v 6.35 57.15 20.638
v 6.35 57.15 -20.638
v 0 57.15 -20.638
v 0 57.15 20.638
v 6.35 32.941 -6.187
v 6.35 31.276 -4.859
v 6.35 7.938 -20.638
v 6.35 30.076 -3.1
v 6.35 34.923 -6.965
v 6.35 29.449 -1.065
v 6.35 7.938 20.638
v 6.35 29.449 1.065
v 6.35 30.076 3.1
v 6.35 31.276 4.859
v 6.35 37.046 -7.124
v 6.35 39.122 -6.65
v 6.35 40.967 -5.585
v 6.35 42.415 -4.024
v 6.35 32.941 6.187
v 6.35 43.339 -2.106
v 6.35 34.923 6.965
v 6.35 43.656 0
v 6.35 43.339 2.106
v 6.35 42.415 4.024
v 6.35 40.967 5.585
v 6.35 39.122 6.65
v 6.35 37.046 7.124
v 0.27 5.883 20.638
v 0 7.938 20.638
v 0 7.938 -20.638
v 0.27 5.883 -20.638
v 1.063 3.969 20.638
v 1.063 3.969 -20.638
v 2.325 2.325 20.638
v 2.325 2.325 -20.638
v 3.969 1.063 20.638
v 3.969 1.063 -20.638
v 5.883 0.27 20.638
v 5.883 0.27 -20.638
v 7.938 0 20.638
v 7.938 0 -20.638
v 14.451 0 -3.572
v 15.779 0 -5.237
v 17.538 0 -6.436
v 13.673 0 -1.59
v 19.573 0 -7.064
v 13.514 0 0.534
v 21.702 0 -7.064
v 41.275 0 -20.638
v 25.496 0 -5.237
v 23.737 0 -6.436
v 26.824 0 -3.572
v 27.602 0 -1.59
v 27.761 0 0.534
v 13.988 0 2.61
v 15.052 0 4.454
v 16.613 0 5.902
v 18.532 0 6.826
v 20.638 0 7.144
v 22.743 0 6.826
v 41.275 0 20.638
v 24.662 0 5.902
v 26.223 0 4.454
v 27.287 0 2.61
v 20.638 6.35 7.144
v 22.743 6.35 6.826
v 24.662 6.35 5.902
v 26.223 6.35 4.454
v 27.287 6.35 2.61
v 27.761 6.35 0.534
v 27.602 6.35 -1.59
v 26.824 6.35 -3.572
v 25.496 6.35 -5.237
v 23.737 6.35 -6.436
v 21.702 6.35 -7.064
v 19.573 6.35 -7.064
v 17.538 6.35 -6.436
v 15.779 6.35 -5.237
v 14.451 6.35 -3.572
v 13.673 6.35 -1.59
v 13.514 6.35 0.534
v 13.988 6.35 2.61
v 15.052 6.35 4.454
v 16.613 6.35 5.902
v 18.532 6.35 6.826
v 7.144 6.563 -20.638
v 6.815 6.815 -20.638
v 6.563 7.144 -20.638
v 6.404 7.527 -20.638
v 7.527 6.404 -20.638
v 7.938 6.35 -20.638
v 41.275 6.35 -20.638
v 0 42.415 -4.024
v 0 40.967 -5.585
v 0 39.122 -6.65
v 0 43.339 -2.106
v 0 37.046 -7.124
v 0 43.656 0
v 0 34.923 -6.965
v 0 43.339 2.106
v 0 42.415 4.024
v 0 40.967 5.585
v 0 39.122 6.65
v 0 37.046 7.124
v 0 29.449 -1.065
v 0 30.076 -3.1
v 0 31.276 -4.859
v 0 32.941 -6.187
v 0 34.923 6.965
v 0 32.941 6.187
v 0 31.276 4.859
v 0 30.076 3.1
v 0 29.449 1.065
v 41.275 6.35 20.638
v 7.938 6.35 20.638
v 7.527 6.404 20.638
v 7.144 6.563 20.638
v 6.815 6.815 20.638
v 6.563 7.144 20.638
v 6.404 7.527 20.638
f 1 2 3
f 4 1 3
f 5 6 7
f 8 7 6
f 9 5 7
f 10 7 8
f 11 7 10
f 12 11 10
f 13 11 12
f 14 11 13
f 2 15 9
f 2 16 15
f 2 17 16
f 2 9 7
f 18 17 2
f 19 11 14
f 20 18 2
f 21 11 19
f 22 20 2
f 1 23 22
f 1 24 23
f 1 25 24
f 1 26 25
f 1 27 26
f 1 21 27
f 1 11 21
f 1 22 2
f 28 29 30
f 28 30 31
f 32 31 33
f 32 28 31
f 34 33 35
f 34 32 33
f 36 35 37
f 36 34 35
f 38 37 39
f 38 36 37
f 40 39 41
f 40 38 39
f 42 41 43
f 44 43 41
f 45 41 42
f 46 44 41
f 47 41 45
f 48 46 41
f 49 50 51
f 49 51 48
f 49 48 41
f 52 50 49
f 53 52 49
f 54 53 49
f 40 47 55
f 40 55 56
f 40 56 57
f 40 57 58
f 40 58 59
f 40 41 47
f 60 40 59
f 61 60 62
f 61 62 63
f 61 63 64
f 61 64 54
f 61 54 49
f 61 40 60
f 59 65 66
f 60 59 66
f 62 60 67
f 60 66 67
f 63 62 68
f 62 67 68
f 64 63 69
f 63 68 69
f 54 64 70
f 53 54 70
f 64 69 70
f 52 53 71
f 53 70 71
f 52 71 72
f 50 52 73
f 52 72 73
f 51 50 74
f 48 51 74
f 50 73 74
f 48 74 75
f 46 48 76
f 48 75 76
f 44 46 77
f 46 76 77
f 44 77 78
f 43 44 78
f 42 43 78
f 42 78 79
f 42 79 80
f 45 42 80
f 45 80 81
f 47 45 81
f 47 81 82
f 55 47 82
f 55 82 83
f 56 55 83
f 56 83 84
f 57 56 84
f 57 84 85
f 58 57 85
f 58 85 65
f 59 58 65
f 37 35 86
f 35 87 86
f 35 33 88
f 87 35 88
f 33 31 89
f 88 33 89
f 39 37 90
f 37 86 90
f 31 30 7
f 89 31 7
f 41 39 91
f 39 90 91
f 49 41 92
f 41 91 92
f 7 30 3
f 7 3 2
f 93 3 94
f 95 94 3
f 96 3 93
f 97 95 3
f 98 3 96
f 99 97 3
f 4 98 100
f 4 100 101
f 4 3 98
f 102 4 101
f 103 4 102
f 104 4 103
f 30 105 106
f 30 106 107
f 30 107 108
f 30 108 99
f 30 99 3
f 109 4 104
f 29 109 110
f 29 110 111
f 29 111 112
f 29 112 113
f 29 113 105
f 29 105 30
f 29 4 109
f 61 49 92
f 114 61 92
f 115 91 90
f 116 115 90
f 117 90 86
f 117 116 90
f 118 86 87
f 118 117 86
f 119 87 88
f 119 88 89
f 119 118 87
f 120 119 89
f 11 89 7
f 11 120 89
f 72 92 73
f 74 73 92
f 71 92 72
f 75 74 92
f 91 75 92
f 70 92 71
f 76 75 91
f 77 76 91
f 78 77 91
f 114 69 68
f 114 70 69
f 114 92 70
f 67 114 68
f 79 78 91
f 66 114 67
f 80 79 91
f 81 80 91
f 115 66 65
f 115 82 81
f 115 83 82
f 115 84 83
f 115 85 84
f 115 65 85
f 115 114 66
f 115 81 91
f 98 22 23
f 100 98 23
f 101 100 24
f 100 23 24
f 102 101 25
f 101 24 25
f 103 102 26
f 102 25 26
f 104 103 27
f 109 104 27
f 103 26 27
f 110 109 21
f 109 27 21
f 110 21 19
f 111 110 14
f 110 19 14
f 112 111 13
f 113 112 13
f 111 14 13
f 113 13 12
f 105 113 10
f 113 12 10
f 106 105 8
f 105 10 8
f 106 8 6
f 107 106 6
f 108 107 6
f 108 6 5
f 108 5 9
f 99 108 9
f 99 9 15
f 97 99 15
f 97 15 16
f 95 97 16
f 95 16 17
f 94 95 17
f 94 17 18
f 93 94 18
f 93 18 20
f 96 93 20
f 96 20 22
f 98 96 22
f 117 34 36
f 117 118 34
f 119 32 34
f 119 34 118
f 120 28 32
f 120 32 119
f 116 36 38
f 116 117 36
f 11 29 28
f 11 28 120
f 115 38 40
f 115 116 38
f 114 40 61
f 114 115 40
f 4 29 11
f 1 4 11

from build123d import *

# Parameters (mm, degrees)
EXTRUDE_THIN1_DEPTH = 20.6375
SKETCH2_R           = 7.14375
CUT_EXTRUDE1_DEPTH  = 69.63069307
SKETCH3_R           = 7.14375
CUT_EXTRUDE2_DEPTH  = 71.084124673


with BuildPart() as part:
    # Sketch1 → Extrude-Thin1 (new, symmetric)
    with BuildSketch(Plane.XY):
        with BuildLine():
            Line((0, 57.15), (0, 7.9375))
            ThreePointArc((0, 7.9375), (2.324839924, 2.324839924), (7.9375, 0))
            Line((7.9375, 0), (41.275, 0))
            Line((41.275, 0), (41.275, 6.35))
            Line((41.275, 6.35), (7.9375, 6.35))
            ThreePointArc((7.9375, 6.35), (6.814967985, 6.814967985), (6.35, 7.9375))
            Line((6.35, 7.9375), (6.35, 57.15))
            Line((6.35, 57.15), (0, 57.15))
        make_face()
    extrude(amount=EXTRUDE_THIN1_DEPTH, both=True)

    # Sketch2 → Cut-Extrude1 (cut, through all)
    with BuildSketch(Plane(origin=(0, 6.35, 0), x_dir=(1, 0, 0), z_dir=(0, 1, 0))):
        with Locations(Location((20.6375, 0, 0), (0, 0, 270))):
            Circle(SKETCH2_R)
    extrude(amount=-CUT_EXTRUDE1_DEPTH, mode=Mode.SUBTRACT)

    # Sketch3 → Cut-Extrude2 (cut, through all)
    with BuildSketch(Plane(origin=(6.35, 0, 0), x_dir=(0, 0, -1), z_dir=(1, 0, 0))):
        with Locations(Location((0, 36.5125, 0), (0, 0, 90))):
            Circle(SKETCH3_R)
    extrude(amount=-CUT_EXTRUDE2_DEPTH, mode=Mode.SUBTRACT)


solid = part.part
